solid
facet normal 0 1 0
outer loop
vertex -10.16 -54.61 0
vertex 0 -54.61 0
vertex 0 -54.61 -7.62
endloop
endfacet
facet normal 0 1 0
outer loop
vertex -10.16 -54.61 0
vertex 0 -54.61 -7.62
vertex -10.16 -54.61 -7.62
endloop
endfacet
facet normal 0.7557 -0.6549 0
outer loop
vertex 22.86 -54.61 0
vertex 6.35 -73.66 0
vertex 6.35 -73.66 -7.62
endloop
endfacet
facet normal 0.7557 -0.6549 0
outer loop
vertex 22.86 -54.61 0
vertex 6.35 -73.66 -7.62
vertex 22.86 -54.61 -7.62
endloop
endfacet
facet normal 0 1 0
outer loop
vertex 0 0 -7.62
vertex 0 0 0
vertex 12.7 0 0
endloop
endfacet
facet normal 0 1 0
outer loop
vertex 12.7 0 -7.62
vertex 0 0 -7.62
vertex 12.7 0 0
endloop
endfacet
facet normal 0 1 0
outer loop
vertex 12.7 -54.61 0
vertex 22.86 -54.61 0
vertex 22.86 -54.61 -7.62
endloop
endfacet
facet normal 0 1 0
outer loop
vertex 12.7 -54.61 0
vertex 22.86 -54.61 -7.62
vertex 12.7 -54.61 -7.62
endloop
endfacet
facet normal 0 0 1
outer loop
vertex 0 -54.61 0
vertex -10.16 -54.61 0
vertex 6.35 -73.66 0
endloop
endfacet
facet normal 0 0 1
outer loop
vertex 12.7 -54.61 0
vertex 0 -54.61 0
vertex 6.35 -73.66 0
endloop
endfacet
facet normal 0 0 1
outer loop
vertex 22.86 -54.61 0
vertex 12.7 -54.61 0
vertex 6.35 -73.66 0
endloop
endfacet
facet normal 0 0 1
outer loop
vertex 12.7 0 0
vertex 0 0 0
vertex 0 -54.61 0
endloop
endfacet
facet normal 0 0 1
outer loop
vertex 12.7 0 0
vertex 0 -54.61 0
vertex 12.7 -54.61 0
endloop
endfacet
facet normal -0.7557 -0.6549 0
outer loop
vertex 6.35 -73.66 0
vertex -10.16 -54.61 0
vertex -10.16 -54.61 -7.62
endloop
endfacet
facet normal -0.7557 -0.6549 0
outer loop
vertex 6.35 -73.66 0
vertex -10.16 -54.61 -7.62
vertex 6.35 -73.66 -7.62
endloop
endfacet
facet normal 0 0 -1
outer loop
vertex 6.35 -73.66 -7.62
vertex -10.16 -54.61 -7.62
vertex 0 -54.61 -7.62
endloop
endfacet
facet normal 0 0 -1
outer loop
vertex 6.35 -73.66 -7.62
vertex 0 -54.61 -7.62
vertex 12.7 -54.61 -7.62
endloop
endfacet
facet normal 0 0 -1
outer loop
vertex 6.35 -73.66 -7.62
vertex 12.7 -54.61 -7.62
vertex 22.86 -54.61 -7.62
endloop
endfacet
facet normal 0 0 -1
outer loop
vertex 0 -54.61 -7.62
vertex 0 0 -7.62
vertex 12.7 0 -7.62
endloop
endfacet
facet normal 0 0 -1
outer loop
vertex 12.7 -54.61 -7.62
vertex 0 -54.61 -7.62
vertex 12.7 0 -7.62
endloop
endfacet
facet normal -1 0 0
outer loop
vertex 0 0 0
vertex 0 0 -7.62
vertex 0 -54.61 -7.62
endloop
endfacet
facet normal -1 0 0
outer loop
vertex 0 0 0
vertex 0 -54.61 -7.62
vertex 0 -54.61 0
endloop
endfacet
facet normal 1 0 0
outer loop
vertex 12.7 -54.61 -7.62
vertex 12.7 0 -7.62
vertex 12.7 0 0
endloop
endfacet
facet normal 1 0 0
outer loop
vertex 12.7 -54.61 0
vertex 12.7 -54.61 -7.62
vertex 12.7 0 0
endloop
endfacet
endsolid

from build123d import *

# Parameters (mm, degrees)
F0_W     = 12.7
F0_H     = 7.62
F1_DEPTH = 63.5
F4_DEPTH = 7.62


with BuildPart() as f1:
    # F0 (on Front) → F1 (new body)
    with BuildSketch(Plane.XZ):
        with Locations((6.35, -3.81)):
            Rectangle(F0_W, F0_H)
    extrude(amount=F1_DEPTH)

    # F3 (on face) → F4 (join)
    with BuildSketch(Plane.XY):
        Polygon((22.86, -54.61), (-10.16, -54.61), (6.35, -73.66), align=None)
    extrude(amount=-F4_DEPTH)


solid = f1.part
